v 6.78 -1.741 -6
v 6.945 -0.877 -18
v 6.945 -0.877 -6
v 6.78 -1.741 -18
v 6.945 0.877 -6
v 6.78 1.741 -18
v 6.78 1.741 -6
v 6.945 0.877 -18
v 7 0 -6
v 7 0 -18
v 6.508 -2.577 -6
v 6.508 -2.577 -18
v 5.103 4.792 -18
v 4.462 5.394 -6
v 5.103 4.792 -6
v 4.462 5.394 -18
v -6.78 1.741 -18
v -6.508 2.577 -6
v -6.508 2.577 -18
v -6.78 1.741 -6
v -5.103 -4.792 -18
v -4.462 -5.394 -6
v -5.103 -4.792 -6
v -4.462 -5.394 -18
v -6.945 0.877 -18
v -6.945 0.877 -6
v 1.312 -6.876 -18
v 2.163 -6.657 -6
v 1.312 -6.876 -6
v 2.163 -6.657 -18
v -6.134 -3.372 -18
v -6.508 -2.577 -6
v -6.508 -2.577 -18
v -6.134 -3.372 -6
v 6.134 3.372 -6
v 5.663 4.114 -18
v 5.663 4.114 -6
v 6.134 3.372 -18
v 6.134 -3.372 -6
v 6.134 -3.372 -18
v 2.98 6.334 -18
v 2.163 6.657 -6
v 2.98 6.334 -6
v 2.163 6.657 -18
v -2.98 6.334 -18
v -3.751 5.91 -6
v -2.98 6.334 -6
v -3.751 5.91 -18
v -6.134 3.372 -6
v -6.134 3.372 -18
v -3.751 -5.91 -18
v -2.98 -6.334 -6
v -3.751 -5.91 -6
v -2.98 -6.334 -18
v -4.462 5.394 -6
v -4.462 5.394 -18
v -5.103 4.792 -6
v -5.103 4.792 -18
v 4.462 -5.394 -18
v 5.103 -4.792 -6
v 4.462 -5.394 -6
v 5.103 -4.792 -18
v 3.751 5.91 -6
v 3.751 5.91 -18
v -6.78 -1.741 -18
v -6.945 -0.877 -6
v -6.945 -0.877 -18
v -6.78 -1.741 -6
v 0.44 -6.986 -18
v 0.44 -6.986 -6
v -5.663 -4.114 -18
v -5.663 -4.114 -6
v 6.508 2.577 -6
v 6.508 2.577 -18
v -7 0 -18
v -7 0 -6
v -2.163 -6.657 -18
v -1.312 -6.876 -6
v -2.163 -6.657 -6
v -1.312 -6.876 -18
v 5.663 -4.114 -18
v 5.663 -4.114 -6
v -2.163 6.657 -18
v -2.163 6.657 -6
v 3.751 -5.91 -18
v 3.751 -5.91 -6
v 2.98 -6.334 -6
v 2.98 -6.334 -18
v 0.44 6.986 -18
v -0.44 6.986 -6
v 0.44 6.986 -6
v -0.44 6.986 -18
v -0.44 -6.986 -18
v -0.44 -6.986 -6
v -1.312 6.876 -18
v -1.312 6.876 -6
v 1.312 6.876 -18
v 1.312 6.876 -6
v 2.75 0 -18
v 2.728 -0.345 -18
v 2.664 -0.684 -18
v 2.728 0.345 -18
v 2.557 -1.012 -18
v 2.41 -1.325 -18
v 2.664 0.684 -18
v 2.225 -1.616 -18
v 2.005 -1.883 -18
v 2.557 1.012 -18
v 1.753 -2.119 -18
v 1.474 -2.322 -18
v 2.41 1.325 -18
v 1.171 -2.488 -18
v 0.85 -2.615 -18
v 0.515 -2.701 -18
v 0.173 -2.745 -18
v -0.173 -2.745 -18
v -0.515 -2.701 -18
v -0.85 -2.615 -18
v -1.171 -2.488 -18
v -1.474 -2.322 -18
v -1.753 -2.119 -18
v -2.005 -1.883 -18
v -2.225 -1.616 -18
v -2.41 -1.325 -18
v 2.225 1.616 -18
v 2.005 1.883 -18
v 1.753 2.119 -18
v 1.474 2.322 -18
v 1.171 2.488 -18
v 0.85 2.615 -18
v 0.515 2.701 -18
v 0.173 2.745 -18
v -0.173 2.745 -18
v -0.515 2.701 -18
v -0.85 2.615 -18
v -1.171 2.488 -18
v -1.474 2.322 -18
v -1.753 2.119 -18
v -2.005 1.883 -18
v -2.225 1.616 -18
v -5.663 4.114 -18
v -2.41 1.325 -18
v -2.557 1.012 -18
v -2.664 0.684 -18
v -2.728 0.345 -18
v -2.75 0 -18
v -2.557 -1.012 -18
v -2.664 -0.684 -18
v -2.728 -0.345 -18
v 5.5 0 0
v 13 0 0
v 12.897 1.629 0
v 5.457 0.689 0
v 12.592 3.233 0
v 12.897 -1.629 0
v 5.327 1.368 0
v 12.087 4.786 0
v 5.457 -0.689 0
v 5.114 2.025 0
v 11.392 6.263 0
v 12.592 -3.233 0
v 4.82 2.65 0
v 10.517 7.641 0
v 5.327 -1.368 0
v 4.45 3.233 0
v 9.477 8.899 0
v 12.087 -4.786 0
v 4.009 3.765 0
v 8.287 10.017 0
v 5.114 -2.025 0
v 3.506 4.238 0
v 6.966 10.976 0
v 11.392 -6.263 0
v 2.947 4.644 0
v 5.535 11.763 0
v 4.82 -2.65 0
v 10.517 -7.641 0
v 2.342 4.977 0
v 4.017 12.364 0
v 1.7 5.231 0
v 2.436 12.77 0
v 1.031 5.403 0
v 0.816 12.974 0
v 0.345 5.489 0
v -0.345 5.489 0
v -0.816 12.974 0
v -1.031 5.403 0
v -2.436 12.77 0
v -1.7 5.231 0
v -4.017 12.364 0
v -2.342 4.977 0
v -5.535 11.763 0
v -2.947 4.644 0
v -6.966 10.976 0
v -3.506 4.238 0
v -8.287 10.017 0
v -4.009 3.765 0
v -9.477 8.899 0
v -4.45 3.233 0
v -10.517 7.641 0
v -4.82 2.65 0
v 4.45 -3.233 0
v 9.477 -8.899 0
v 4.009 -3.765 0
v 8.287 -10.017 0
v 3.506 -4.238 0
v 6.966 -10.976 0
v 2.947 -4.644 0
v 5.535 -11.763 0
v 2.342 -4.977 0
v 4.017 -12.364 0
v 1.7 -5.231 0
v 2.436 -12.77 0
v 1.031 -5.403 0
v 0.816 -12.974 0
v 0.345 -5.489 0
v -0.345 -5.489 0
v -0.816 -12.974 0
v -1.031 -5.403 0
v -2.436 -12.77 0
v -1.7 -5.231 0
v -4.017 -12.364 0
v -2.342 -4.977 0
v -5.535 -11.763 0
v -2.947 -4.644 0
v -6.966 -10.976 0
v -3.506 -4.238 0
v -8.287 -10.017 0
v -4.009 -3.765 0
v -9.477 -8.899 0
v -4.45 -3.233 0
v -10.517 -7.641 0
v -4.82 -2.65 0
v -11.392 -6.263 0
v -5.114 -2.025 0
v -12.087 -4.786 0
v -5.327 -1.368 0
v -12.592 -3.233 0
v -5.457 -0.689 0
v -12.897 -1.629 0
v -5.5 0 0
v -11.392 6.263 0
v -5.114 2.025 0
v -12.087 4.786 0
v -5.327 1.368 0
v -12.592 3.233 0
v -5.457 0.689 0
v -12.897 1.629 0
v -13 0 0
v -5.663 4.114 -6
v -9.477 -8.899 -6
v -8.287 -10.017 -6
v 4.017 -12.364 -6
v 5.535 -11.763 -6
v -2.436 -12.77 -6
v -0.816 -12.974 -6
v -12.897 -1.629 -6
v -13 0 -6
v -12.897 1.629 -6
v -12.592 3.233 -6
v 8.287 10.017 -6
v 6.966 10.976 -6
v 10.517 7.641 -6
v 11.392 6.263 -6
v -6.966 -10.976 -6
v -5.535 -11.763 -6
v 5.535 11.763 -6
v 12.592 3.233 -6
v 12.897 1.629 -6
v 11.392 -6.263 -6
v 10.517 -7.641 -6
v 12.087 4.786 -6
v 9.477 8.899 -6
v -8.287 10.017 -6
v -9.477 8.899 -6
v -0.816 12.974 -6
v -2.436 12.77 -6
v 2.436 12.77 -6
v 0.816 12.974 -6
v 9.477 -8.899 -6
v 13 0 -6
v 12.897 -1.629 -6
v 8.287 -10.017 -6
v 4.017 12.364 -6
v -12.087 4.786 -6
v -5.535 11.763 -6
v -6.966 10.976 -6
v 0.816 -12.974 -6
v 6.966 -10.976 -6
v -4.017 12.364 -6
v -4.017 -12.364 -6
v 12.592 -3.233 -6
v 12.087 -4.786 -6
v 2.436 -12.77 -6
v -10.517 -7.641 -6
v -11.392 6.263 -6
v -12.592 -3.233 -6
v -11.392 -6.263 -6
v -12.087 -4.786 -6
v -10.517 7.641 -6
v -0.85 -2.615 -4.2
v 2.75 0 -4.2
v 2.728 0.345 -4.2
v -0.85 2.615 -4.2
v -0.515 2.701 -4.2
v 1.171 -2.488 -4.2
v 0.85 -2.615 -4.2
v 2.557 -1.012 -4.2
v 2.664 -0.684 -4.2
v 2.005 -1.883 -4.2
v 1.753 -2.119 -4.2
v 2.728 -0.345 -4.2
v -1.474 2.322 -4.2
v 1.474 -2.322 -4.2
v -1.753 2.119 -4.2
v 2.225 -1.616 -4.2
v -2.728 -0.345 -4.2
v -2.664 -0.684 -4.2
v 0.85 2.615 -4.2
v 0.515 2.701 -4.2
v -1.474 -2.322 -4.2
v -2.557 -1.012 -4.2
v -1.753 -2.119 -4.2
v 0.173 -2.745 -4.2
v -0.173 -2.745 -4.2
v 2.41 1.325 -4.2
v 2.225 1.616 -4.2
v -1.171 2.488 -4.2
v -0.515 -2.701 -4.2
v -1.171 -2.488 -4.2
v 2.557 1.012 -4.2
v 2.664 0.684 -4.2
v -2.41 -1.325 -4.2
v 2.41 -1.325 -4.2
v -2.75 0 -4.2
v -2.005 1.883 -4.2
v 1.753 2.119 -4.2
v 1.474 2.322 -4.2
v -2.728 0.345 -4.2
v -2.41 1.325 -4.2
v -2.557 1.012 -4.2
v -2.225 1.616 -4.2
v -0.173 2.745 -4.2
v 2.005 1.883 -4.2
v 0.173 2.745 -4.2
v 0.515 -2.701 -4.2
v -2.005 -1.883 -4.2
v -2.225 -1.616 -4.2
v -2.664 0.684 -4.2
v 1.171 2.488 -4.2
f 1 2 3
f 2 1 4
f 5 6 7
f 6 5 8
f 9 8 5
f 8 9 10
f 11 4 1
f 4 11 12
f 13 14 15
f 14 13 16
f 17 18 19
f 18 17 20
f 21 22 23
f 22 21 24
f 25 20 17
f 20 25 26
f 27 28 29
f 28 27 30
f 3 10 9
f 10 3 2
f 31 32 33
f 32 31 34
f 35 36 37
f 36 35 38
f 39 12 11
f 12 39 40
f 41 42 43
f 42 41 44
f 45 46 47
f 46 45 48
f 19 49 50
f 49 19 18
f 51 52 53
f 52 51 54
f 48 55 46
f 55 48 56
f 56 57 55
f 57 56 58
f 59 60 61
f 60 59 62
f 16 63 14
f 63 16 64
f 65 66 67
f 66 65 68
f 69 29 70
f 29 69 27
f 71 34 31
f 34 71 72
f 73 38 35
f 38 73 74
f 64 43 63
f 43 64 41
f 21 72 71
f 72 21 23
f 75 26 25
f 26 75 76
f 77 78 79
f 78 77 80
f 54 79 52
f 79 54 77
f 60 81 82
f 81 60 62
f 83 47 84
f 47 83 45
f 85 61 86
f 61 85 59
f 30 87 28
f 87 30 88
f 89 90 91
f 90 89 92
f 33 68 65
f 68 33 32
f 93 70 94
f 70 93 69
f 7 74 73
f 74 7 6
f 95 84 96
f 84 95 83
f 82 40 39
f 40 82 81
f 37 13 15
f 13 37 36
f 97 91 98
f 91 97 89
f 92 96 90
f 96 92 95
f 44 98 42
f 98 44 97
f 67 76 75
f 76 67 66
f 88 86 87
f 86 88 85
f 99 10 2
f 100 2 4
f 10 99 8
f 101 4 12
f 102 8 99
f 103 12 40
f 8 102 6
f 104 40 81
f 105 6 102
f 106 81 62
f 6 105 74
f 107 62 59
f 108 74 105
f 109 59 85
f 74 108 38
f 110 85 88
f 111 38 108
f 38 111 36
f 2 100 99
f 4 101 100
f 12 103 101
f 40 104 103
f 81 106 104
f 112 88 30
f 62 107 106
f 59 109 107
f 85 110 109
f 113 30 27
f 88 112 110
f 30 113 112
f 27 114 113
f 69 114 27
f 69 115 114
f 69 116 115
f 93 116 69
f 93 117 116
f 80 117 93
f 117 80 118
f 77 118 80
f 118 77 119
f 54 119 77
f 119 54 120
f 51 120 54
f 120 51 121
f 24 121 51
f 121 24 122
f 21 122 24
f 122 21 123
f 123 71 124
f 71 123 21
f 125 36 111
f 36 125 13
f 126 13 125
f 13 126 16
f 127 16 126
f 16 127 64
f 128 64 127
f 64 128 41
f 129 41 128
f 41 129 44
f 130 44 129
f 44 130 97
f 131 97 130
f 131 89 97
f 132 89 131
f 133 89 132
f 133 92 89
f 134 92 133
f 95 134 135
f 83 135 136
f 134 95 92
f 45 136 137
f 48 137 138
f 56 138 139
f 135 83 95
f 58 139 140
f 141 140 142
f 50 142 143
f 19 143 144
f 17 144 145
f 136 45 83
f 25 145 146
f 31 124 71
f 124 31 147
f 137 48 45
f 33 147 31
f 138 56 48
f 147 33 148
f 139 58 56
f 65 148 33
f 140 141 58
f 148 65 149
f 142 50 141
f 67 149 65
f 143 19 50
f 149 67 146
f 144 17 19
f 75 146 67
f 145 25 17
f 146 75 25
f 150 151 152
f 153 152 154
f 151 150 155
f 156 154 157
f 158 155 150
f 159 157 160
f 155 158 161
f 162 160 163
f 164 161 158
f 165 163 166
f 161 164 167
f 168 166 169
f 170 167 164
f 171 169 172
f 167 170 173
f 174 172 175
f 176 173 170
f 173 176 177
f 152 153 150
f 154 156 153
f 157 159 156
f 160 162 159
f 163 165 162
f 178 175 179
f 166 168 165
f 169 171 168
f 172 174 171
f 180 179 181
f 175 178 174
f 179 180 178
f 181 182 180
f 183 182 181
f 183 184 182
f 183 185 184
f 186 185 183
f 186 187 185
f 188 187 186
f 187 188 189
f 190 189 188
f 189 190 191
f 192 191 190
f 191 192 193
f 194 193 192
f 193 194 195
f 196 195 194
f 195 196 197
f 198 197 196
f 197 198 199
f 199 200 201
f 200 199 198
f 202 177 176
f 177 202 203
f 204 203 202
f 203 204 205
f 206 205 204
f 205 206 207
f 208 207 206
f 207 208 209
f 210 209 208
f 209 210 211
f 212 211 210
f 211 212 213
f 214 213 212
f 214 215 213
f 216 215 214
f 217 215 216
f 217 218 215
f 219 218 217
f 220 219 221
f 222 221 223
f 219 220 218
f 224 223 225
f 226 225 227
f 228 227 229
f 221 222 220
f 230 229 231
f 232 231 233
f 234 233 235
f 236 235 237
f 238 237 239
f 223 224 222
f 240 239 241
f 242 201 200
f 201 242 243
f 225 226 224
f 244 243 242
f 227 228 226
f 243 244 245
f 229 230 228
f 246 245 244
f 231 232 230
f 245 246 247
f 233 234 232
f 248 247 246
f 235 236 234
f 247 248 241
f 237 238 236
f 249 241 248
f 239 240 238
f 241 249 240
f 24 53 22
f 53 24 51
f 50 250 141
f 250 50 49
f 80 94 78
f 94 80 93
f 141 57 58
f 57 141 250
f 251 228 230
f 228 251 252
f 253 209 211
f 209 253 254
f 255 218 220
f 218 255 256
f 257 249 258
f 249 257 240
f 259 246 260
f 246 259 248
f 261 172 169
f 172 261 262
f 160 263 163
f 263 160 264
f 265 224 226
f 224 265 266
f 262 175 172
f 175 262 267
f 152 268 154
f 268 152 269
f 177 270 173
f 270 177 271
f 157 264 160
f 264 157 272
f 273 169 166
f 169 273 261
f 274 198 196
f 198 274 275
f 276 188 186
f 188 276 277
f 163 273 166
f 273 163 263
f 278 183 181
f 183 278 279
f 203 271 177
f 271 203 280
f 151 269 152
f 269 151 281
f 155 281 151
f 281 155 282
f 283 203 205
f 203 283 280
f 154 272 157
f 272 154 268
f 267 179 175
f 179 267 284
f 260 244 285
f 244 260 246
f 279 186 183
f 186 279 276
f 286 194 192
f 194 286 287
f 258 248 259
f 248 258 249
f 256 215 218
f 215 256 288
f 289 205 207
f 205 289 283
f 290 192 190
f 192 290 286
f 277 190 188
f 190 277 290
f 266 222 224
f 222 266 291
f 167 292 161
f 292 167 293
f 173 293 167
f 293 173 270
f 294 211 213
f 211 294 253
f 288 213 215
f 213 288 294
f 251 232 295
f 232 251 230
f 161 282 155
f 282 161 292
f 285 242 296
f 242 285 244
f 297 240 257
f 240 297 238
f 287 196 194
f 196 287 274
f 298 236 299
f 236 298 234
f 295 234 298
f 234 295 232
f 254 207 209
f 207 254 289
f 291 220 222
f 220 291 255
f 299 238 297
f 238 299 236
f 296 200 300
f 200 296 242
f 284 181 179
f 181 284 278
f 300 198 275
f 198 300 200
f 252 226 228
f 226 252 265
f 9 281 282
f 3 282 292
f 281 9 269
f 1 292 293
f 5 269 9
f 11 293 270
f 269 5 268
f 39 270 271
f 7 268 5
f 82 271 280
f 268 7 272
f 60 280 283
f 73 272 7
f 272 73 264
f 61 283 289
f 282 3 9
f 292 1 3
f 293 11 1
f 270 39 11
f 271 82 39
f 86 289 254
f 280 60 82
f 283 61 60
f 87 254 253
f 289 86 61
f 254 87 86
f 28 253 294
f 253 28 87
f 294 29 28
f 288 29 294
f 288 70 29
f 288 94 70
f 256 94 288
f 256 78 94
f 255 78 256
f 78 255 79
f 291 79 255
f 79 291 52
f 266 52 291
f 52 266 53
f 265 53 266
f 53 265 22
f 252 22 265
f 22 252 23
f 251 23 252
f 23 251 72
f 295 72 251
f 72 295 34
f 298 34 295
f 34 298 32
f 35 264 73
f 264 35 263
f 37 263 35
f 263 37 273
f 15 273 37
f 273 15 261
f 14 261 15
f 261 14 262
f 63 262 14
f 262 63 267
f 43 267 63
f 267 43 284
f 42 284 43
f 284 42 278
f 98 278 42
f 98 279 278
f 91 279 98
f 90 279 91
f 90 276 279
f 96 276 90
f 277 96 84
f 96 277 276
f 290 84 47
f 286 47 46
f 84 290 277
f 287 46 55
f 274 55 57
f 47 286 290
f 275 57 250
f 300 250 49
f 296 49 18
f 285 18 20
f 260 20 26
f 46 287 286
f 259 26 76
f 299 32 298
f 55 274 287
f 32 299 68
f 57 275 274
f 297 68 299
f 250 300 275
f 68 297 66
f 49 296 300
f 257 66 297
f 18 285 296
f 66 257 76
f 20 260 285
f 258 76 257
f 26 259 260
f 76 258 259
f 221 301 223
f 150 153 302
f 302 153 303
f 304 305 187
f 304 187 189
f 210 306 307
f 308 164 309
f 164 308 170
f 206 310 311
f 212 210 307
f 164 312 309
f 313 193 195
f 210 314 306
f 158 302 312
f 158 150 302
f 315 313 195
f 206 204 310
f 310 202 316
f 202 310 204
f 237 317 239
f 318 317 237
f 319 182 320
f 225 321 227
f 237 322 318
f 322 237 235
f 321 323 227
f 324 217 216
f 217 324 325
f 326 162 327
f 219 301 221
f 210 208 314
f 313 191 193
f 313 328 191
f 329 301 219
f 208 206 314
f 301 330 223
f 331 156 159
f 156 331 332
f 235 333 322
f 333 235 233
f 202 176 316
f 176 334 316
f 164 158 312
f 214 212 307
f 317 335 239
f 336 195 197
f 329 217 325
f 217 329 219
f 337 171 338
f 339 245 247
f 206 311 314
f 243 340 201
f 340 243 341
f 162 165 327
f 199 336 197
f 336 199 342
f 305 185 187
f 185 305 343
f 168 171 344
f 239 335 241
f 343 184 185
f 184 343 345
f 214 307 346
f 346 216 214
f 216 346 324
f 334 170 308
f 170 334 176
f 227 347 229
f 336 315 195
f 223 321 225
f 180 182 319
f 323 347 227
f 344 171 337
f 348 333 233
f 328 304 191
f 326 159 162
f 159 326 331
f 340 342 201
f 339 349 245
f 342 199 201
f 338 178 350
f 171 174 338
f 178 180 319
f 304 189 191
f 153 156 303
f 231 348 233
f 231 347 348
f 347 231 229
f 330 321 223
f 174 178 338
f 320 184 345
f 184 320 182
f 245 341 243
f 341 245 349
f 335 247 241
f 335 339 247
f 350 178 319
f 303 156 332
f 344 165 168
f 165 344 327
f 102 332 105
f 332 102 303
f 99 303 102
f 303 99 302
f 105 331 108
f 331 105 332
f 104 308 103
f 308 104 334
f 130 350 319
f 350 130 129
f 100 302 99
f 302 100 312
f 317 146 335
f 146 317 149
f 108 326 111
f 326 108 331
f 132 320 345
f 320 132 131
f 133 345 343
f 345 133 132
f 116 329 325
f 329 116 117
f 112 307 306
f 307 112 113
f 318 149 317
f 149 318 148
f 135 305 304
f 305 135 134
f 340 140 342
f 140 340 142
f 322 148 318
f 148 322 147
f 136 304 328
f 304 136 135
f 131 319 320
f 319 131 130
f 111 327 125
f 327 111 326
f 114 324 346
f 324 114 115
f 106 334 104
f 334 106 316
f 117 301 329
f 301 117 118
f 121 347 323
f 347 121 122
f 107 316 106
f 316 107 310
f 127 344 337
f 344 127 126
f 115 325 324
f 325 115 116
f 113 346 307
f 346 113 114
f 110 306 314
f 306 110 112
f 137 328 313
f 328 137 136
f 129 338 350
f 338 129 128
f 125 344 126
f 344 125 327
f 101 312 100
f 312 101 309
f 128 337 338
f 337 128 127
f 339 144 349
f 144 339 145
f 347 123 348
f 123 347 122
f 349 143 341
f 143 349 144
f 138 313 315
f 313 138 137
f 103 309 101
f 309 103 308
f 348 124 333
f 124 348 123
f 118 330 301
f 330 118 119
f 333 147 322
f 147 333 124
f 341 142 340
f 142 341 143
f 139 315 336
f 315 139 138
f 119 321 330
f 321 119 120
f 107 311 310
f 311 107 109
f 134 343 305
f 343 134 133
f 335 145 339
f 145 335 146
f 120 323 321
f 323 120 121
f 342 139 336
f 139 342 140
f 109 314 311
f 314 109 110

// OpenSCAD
$fn = 50;


difference() {
	union() {
		translate(v = [0, 0, -18.0000000000]) {
			cylinder(h = 18, r = 7.0000000000);
		}
		translate(v = [0, 0, -6.0000000000]) {
			cylinder(h = 6, r = 13.0000000000);
		}
	}
	union() {
		translate(v = [0, 0, 0]) {
			rotate(a = [0, 0, 0]) {
				difference() {
					union() {
						#translate(v = [0, 0, -18.0000000000]) {
							cylinder(h = 18, r = 2.2500000000);
						}
						#translate(v = [0, 0, -4.2000000000]) {
							cylinder(h = 4.2000000000, r = 7.0000000000, r1 = 2.7500000000, r2 = 5.5000000000);
						}
						#translate(v = [0, 0, -18.0000000000]) {
							cylinder(h = 18, r = 2.7500000000);
						}
						#translate(v = [0, 0, -18.0000000000]) {
							cylinder(h = 18, r = 2.2500000000);
						}
					}
					union();
				}
			}
		}
	}
}
